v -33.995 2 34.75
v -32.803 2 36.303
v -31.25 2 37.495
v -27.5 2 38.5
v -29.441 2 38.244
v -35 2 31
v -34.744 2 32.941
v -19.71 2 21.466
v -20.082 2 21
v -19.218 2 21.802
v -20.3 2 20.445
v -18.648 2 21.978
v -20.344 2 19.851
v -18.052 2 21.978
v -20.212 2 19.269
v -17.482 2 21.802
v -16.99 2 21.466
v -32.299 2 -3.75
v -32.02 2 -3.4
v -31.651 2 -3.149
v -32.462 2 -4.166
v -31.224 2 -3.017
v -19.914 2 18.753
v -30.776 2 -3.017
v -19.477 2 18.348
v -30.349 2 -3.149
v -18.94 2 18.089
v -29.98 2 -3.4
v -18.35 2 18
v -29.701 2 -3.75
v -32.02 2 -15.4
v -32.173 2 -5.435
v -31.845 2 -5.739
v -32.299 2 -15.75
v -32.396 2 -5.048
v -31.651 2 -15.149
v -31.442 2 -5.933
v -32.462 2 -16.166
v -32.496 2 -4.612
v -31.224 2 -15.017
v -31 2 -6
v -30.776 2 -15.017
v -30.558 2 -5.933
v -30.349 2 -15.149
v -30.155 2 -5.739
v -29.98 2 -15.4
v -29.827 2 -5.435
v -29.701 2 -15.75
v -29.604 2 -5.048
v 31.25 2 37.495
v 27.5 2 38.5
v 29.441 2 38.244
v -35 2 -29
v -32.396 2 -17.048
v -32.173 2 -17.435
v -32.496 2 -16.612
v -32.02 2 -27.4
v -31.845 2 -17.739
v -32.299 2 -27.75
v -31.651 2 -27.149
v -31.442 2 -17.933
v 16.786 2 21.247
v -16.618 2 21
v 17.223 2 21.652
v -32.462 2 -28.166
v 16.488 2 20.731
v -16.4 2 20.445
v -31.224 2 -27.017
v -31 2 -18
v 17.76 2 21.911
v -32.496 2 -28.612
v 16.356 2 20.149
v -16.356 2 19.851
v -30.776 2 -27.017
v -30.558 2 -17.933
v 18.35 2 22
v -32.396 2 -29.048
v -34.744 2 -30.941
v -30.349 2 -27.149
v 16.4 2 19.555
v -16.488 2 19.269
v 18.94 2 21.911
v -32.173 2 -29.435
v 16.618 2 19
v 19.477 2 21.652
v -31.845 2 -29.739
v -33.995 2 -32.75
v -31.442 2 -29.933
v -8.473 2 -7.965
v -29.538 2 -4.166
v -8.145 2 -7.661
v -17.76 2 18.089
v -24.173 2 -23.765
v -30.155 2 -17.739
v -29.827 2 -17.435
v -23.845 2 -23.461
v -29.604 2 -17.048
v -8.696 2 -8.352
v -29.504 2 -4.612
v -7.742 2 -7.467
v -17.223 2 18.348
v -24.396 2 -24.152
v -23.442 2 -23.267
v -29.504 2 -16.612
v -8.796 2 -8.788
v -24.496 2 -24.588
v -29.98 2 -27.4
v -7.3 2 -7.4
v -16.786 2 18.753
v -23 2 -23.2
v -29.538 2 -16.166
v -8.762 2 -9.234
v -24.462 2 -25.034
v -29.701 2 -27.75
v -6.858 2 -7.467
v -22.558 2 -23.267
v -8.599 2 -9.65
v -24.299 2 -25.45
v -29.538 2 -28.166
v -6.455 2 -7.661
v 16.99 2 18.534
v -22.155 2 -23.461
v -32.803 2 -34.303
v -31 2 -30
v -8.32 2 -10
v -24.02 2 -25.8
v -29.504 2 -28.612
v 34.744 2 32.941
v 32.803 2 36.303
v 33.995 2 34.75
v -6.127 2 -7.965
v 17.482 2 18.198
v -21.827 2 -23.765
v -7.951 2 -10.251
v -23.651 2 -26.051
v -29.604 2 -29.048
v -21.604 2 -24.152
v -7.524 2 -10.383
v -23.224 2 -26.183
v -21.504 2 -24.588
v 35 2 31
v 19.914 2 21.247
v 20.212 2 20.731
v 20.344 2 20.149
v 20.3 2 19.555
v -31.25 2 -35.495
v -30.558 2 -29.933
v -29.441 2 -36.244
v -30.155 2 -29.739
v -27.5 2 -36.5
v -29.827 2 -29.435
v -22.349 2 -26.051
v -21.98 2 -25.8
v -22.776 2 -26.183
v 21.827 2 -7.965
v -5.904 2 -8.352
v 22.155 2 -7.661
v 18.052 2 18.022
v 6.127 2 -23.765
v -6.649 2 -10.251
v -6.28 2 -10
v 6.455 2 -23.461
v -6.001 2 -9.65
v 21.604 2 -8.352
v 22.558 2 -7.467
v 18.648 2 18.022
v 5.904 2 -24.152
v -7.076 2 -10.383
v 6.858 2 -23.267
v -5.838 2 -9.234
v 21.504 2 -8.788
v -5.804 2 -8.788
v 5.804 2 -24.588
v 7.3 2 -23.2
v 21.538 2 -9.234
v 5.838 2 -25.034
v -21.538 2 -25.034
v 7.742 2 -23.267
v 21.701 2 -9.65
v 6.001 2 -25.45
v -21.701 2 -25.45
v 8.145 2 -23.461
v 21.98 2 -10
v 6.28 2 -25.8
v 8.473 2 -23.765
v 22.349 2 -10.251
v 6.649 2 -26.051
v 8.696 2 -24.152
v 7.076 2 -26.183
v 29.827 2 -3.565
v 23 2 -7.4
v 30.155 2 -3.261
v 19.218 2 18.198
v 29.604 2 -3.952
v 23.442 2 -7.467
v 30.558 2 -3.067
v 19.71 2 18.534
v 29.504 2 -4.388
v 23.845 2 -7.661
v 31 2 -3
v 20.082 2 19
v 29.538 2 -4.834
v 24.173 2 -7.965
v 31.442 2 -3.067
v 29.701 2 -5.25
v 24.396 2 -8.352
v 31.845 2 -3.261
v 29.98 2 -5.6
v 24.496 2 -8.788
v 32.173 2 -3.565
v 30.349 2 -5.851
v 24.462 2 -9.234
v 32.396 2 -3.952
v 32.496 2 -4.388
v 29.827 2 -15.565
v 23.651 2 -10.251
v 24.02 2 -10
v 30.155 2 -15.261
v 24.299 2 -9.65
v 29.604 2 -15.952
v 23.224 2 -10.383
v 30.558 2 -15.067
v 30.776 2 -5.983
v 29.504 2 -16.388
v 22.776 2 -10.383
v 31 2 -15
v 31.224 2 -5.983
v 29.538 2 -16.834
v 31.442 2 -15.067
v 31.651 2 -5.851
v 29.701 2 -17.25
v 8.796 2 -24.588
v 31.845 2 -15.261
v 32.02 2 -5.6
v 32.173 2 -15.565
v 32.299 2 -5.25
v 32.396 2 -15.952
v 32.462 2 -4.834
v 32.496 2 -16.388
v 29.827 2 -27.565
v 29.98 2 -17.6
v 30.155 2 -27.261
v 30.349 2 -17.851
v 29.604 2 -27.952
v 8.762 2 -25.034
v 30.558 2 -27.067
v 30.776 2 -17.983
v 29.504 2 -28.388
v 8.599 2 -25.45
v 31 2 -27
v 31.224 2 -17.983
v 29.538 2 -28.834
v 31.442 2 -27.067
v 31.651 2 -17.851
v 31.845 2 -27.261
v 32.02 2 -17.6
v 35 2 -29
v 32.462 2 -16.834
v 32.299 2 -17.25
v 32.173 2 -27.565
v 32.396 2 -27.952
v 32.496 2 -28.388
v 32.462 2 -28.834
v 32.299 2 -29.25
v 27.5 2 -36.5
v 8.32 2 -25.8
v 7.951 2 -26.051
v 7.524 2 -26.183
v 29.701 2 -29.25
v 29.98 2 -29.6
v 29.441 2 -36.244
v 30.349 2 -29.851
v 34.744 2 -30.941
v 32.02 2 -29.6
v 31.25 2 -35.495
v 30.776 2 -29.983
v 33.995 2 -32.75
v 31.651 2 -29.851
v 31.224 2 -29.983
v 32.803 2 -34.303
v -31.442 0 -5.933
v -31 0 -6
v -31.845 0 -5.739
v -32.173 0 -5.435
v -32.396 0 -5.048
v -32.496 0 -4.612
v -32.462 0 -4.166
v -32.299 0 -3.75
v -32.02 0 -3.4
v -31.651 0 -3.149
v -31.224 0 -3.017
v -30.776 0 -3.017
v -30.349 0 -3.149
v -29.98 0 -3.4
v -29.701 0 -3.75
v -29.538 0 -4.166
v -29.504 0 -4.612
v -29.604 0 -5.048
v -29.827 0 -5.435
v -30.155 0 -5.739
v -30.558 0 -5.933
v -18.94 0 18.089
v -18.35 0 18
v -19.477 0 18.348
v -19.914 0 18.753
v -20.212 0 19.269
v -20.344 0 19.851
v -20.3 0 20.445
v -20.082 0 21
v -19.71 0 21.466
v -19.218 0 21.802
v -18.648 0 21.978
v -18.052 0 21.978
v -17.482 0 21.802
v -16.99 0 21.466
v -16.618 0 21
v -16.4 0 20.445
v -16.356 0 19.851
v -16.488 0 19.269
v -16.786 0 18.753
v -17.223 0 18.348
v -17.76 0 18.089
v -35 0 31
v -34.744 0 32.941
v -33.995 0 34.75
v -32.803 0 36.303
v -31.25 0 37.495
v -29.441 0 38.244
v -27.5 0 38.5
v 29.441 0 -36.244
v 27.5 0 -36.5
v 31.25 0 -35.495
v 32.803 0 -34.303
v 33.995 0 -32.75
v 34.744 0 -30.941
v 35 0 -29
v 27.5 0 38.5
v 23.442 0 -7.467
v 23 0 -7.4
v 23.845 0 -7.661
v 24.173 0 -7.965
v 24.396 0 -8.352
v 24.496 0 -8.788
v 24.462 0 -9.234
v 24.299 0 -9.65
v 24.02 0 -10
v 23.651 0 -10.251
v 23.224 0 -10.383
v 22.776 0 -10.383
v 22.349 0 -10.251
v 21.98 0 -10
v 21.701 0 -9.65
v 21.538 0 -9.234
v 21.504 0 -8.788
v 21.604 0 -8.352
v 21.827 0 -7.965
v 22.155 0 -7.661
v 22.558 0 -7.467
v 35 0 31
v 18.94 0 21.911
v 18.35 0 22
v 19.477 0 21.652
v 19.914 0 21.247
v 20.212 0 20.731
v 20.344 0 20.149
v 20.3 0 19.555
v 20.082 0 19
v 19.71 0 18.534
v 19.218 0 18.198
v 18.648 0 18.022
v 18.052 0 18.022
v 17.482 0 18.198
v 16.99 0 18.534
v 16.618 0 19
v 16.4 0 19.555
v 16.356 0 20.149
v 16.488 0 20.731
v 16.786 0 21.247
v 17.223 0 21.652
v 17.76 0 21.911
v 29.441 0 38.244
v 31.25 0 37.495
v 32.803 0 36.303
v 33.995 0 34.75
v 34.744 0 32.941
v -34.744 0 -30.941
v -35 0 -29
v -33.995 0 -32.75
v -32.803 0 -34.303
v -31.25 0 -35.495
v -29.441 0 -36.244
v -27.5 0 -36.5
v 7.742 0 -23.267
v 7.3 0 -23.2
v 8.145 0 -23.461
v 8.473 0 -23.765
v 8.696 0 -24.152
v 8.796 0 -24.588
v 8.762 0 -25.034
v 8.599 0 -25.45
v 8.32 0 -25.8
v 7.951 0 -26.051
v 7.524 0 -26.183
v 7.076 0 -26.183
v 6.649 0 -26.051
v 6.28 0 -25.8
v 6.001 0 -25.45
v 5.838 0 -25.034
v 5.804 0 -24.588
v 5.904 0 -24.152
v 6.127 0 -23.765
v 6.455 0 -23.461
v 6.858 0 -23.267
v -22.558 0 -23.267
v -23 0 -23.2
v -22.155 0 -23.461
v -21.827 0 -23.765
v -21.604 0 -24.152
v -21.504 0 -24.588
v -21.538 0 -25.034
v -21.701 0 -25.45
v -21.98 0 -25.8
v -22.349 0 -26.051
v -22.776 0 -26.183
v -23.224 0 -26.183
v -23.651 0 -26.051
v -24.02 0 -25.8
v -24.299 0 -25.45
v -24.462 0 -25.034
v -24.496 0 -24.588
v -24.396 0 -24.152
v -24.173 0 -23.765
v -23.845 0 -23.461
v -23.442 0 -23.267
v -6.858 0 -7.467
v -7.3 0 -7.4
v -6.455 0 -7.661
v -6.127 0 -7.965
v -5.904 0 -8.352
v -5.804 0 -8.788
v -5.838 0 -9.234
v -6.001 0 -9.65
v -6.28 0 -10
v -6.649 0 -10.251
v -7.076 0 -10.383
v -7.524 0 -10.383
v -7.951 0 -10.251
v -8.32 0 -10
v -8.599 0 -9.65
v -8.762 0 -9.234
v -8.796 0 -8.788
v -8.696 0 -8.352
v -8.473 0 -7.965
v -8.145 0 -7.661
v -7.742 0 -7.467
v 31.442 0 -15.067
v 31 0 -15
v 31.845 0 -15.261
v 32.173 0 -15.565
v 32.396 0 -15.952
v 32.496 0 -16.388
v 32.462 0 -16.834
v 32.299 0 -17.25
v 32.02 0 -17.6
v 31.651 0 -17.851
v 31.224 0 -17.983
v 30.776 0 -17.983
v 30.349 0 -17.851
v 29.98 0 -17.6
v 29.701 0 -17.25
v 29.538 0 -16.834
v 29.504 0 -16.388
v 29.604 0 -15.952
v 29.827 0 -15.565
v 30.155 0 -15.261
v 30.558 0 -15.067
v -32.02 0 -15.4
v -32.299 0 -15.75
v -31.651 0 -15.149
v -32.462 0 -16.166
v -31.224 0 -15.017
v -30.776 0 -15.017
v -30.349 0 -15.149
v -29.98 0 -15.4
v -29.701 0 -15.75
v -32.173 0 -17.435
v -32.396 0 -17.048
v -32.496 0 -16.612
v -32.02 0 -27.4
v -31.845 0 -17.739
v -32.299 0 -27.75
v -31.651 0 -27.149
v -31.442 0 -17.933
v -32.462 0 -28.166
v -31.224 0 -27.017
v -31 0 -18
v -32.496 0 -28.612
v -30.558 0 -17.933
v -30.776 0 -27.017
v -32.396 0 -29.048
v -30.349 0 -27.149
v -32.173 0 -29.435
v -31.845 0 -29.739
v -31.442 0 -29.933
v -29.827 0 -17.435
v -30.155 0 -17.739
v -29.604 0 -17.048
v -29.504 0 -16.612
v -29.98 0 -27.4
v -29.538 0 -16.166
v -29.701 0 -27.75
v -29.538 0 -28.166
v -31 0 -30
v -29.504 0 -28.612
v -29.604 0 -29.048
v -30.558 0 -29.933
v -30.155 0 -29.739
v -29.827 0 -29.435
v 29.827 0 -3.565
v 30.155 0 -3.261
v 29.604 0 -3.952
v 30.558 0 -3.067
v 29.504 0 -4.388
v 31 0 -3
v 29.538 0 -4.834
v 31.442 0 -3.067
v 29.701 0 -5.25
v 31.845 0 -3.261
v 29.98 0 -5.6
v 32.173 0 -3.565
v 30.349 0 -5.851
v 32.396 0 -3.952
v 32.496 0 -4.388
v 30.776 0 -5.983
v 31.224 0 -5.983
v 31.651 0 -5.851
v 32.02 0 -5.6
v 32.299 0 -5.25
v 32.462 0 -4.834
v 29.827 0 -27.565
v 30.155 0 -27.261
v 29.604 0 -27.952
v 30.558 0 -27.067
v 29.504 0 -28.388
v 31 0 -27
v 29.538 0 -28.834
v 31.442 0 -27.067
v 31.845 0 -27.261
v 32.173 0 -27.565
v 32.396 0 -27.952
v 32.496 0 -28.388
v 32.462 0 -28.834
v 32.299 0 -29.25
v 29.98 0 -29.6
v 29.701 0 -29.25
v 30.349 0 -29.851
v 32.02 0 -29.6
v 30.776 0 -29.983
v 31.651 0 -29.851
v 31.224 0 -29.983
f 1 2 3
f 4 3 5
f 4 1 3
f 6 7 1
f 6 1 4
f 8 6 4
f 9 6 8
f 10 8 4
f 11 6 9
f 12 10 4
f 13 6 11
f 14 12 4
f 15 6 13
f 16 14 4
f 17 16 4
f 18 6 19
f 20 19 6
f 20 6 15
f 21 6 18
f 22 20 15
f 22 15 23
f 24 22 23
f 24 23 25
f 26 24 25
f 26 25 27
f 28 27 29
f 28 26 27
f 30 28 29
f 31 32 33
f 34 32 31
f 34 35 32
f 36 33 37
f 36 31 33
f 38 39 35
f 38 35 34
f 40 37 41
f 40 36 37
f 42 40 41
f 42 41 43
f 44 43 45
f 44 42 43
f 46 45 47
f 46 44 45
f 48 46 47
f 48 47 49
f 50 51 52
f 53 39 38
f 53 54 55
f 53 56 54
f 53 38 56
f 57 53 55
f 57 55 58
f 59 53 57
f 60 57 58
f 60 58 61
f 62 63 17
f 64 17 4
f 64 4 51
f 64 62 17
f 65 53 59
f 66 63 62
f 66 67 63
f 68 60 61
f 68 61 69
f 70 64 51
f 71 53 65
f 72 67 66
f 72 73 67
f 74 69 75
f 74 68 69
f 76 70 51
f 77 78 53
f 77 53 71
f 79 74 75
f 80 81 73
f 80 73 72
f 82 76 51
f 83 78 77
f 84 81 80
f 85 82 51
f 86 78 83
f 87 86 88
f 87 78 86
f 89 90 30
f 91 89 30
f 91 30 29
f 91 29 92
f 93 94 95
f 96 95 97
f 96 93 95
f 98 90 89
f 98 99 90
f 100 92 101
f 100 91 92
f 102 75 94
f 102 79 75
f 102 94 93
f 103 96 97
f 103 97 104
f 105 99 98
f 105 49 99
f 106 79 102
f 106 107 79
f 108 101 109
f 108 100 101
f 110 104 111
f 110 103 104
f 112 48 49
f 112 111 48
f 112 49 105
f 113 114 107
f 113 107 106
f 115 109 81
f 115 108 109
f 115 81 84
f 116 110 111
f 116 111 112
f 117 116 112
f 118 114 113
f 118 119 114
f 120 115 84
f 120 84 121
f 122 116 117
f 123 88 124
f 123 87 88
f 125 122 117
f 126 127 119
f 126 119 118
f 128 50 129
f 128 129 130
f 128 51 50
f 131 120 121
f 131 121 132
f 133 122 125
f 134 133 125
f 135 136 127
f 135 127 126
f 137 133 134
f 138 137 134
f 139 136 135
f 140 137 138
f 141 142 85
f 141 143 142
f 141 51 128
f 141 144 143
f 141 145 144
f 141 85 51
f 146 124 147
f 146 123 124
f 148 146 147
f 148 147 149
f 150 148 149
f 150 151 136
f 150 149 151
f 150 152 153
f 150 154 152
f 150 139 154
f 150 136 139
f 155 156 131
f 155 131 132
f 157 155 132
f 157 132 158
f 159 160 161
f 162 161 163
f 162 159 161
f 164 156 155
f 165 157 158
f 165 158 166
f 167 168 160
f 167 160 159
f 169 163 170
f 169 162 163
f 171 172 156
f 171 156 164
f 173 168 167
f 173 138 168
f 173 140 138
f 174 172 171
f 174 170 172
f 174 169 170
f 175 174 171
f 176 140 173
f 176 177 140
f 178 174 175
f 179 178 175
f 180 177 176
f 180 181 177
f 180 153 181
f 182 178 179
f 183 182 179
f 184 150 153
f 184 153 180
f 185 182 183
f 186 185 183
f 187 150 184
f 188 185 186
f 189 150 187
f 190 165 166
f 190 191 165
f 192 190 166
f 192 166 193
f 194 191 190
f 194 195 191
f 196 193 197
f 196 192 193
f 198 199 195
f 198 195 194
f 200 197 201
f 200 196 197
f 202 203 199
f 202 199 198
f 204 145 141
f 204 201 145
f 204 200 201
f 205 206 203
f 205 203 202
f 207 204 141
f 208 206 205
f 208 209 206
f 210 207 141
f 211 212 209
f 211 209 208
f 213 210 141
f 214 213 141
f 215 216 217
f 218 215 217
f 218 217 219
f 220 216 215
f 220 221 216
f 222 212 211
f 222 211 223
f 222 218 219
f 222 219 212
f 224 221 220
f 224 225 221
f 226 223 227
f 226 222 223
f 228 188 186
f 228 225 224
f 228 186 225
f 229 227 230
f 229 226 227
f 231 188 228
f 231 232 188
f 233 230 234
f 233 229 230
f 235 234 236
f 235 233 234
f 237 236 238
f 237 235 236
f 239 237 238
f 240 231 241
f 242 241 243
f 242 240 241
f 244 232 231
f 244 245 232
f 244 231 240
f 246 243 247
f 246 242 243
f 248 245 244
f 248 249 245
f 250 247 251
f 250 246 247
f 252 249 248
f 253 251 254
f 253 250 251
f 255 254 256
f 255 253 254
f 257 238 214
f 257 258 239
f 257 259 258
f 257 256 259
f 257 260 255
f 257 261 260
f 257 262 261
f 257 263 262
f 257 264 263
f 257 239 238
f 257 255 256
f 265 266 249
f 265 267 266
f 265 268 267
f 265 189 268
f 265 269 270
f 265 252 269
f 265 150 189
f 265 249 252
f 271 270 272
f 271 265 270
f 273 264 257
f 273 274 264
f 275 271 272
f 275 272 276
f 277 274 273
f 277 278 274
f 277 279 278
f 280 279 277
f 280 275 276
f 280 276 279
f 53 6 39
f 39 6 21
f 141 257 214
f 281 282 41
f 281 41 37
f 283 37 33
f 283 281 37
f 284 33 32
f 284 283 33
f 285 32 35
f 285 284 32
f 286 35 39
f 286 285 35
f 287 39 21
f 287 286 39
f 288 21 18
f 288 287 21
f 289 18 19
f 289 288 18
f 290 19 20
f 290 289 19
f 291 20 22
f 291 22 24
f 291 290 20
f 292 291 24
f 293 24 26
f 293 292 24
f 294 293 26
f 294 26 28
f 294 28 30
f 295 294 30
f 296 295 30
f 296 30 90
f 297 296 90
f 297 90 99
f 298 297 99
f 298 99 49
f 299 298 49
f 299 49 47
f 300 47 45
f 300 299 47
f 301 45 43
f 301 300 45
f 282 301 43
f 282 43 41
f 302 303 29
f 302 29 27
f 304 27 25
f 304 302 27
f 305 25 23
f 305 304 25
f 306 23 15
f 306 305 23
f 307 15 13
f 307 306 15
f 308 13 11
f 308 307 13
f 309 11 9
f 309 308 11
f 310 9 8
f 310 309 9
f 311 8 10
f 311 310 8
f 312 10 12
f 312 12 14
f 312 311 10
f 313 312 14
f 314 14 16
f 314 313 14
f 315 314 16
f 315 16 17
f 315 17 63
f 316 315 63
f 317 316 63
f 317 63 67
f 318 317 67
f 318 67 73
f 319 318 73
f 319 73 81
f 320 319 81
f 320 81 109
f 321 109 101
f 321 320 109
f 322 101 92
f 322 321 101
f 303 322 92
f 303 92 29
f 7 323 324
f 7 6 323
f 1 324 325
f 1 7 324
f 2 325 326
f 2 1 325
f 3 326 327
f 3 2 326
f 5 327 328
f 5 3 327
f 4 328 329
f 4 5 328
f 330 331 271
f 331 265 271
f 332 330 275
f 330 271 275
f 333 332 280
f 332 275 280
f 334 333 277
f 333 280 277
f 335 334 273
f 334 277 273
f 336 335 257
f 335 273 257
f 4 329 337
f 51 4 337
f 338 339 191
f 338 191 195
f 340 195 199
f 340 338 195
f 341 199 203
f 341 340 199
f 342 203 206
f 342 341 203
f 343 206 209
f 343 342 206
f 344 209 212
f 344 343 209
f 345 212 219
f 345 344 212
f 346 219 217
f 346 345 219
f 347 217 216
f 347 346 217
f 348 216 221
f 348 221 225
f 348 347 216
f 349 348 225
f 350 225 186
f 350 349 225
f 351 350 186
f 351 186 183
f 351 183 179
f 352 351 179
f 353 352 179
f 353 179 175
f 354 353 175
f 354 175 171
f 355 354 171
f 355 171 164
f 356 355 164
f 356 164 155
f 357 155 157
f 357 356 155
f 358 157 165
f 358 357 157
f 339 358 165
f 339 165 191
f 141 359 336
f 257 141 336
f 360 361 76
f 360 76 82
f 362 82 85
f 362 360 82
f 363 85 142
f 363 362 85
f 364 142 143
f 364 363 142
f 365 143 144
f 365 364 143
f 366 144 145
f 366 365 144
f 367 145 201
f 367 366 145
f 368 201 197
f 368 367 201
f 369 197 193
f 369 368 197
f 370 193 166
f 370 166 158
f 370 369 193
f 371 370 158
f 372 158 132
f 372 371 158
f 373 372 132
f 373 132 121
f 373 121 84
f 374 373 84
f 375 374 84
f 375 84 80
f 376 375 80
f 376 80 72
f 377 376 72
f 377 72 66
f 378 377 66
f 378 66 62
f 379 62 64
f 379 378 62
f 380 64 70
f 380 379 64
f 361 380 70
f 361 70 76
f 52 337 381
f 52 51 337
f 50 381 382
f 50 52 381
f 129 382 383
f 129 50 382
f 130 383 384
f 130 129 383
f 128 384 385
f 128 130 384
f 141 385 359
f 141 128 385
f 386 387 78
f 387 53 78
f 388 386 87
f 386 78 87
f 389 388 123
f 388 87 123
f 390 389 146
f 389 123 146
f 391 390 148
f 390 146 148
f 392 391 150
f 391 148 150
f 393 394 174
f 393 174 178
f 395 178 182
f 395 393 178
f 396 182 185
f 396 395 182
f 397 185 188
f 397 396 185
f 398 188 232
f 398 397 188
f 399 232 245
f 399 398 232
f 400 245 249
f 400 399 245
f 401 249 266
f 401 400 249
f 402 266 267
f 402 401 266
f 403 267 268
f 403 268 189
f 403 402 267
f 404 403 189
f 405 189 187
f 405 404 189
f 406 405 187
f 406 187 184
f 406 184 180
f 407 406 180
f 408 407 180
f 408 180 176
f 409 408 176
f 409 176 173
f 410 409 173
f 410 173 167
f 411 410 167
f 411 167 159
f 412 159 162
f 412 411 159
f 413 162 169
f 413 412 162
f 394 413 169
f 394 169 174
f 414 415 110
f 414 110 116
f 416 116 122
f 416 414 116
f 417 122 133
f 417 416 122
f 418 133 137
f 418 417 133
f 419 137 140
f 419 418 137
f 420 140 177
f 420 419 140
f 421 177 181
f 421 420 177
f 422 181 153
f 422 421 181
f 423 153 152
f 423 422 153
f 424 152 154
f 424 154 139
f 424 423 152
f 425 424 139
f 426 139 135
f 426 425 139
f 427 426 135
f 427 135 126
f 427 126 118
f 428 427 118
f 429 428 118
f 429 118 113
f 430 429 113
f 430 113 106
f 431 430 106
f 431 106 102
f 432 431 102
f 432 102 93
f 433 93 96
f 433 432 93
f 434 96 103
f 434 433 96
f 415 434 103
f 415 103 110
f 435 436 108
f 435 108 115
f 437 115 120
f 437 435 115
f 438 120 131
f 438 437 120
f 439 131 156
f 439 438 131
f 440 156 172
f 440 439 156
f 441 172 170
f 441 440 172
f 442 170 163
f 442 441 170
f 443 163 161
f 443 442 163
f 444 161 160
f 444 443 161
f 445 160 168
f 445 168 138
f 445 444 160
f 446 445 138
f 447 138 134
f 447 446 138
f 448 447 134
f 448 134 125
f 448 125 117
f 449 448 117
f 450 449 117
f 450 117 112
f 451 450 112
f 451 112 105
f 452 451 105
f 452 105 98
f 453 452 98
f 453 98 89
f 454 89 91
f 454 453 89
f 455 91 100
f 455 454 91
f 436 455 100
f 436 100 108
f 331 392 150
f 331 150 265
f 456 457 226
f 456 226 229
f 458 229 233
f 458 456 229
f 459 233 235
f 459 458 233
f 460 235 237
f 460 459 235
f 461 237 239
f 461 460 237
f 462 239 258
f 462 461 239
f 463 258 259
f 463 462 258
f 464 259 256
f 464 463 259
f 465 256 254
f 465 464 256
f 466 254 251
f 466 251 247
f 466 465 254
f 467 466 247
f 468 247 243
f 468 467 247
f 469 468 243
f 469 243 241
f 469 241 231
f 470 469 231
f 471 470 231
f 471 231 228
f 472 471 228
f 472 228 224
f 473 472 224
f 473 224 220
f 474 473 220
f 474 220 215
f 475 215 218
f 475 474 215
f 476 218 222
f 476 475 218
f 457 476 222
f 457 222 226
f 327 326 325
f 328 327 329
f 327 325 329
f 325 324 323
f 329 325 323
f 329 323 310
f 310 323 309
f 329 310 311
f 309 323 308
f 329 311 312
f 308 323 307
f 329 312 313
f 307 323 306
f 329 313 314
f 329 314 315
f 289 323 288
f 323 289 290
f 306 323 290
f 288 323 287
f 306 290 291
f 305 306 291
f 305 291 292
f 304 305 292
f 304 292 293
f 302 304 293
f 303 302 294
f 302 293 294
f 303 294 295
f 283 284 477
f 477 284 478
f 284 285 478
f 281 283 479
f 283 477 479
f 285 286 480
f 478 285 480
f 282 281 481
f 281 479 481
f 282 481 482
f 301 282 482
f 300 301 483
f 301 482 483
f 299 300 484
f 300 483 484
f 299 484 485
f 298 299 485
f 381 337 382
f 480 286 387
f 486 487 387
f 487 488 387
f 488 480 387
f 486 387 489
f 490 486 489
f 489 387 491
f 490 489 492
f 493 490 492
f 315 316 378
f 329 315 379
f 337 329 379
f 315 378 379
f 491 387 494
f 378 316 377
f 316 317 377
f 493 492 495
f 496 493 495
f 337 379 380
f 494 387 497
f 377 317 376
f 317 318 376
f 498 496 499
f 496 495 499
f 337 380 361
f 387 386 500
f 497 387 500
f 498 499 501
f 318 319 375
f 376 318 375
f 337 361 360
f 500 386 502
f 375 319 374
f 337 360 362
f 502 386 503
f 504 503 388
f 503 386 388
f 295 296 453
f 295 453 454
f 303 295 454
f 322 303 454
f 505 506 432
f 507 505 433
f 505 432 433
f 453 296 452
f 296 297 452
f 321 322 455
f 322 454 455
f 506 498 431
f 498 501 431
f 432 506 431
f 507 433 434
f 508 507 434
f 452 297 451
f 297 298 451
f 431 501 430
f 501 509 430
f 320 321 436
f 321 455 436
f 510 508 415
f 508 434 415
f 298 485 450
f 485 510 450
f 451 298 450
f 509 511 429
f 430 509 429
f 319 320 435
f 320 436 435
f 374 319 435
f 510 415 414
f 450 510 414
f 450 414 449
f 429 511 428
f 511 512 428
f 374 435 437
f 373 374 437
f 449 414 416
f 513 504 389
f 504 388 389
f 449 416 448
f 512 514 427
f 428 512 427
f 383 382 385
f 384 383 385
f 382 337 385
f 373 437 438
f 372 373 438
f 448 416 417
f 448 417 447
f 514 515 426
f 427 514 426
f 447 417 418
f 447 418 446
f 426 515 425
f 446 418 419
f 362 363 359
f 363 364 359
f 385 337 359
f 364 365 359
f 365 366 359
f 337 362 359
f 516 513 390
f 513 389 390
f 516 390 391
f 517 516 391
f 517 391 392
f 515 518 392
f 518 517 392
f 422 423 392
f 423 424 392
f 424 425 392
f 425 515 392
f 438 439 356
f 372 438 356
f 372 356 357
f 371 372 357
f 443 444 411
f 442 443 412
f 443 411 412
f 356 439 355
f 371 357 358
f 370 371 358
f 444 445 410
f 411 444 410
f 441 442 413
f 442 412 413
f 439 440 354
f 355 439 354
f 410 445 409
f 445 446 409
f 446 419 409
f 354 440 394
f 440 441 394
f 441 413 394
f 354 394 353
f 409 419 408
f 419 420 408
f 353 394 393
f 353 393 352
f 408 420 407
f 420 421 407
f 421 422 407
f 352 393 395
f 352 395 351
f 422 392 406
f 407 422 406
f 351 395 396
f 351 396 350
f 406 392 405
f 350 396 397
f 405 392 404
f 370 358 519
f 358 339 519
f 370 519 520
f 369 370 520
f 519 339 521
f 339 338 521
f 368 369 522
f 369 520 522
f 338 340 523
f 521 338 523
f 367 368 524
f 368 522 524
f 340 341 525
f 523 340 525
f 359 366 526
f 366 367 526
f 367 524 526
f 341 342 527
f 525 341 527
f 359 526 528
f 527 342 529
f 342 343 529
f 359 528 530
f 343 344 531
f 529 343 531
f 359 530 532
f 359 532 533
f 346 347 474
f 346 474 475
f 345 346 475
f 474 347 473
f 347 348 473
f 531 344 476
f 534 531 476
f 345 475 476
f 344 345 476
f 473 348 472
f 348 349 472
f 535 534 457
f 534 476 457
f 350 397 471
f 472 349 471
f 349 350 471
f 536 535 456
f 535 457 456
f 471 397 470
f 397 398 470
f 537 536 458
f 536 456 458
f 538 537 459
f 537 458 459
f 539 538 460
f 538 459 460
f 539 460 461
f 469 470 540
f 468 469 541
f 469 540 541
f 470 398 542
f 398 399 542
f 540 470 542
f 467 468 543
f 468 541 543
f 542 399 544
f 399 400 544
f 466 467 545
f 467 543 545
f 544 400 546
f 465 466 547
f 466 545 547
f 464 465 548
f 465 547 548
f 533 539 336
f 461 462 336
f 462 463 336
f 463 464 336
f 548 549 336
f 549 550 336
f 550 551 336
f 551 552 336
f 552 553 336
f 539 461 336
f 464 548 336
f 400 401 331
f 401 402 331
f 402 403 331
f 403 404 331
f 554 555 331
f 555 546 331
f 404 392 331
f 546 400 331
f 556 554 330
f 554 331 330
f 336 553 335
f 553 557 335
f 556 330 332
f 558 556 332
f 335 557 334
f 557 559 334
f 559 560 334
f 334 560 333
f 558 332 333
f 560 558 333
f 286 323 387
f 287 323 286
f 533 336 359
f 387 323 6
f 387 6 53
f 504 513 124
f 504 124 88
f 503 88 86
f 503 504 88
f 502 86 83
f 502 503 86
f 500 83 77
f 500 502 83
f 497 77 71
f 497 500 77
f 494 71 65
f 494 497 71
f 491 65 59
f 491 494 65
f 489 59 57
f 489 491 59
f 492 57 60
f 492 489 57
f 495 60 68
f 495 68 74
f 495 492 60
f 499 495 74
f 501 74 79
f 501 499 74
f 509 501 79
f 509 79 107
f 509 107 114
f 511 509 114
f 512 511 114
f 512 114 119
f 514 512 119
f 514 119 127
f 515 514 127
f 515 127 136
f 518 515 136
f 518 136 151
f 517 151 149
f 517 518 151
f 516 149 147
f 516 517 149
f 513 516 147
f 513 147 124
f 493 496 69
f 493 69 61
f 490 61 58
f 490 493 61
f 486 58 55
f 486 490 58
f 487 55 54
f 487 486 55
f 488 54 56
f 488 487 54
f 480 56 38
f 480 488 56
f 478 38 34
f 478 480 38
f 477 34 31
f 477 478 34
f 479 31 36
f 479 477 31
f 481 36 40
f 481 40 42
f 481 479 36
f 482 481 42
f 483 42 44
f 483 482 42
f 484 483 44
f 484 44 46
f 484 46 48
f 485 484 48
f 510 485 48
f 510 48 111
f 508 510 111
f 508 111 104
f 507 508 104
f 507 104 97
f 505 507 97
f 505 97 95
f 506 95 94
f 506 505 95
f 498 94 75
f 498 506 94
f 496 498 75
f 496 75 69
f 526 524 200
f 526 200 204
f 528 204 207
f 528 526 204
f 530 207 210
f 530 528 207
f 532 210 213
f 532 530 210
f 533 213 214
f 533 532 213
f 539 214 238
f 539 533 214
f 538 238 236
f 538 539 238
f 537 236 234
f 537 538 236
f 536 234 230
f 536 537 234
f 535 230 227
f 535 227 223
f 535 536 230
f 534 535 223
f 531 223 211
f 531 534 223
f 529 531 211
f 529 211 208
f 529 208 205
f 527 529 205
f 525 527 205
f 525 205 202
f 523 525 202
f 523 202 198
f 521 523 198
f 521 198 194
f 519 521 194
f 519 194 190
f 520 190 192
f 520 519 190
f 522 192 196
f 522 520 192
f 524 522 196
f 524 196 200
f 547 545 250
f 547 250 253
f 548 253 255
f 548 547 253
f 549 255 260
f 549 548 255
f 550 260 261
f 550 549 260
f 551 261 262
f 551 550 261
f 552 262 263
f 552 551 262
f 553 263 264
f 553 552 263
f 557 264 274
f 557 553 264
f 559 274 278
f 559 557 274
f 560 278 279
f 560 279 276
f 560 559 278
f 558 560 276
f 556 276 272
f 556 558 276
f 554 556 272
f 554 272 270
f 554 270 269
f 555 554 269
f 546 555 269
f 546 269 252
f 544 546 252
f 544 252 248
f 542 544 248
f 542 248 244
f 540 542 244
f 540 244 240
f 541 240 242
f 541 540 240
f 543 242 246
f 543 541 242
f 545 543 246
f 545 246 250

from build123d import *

# Parameters (mm, degrees)
SKETCH1_W           = 70
SKETCH1_H           = 75
SKETCH1_R           = 1.5
SKETCH1_R_2         = 2
BOSS_EXTRUDE1_DEPTH = 2
FILLET2_R           = 7.5


with BuildPart() as part:
    # Sketch1 → Boss-Extrude1 (new body)
    with BuildSketch(Plane(origin=(0, 0, 0), x_dir=(1, 0, 0), z_dir=(0, 1, 0))):
        with Locations((0, -1)):
            Rectangle(SKETCH1_W, SKETCH1_H)
        with Locations(Location((7.3, 24.7, 0), (0, 0, 270))):
            Circle(SKETCH1_R, mode=Mode.SUBTRACT)
        with Locations(Location((23, 8.9, 0), (0, 0, 270))):
            Circle(SKETCH1_R, mode=Mode.SUBTRACT)
        with Locations(Location((-23, 24.7, 0), (0, 0, 270))):
            Circle(SKETCH1_R, mode=Mode.SUBTRACT)
        with Locations(Location((-7.3, 8.9, 0), (0, 0, 270))):
            Circle(SKETCH1_R, mode=Mode.SUBTRACT)
        with Locations(Location((31, 16.5, 0), (0, 0, 270))):
            Circle(SKETCH1_R, mode=Mode.SUBTRACT)
        with Locations(Location((31, 28.5, 0), (0, 0, 270))):
            Circle(SKETCH1_R, mode=Mode.SUBTRACT)
        with Locations(Location((31, 4.5, 0), (0, 0, 270))):
            Circle(SKETCH1_R, mode=Mode.SUBTRACT)
        with Locations(Location((-31, 28.5, 0), (0, 0, 90))):
            Circle(SKETCH1_R, mode=Mode.SUBTRACT)
        with Locations(Location((-31, 16.5, 0), (0, 0, 90))):
            Circle(SKETCH1_R, mode=Mode.SUBTRACT)
        with Locations(Location((-31, 4.5, 0), (0, 0, 90))):
            Circle(SKETCH1_R, mode=Mode.SUBTRACT)
        with Locations(Location((18.35, -20, 0), (0, 0, 270))):
            Circle(SKETCH1_R_2, mode=Mode.SUBTRACT)
        with Locations(Location((-18.35, -20, 0), (0, 0, 90))):
            Circle(SKETCH1_R_2, mode=Mode.SUBTRACT)
    extrude(amount=BOSS_EXTRUDE1_DEPTH)

    # Fillet2
    fillet2_edges = [part.edges().sort_by_distance(p)[0] for p in [
        (-35, 1, -36.5),
        (35, 1, -36.5),
        (35, 1, 38.5),
        (-35, 1, 38.5),
    ]]
    fillet(fillet2_edges, radius=FILLET2_R)


solid = part.part
